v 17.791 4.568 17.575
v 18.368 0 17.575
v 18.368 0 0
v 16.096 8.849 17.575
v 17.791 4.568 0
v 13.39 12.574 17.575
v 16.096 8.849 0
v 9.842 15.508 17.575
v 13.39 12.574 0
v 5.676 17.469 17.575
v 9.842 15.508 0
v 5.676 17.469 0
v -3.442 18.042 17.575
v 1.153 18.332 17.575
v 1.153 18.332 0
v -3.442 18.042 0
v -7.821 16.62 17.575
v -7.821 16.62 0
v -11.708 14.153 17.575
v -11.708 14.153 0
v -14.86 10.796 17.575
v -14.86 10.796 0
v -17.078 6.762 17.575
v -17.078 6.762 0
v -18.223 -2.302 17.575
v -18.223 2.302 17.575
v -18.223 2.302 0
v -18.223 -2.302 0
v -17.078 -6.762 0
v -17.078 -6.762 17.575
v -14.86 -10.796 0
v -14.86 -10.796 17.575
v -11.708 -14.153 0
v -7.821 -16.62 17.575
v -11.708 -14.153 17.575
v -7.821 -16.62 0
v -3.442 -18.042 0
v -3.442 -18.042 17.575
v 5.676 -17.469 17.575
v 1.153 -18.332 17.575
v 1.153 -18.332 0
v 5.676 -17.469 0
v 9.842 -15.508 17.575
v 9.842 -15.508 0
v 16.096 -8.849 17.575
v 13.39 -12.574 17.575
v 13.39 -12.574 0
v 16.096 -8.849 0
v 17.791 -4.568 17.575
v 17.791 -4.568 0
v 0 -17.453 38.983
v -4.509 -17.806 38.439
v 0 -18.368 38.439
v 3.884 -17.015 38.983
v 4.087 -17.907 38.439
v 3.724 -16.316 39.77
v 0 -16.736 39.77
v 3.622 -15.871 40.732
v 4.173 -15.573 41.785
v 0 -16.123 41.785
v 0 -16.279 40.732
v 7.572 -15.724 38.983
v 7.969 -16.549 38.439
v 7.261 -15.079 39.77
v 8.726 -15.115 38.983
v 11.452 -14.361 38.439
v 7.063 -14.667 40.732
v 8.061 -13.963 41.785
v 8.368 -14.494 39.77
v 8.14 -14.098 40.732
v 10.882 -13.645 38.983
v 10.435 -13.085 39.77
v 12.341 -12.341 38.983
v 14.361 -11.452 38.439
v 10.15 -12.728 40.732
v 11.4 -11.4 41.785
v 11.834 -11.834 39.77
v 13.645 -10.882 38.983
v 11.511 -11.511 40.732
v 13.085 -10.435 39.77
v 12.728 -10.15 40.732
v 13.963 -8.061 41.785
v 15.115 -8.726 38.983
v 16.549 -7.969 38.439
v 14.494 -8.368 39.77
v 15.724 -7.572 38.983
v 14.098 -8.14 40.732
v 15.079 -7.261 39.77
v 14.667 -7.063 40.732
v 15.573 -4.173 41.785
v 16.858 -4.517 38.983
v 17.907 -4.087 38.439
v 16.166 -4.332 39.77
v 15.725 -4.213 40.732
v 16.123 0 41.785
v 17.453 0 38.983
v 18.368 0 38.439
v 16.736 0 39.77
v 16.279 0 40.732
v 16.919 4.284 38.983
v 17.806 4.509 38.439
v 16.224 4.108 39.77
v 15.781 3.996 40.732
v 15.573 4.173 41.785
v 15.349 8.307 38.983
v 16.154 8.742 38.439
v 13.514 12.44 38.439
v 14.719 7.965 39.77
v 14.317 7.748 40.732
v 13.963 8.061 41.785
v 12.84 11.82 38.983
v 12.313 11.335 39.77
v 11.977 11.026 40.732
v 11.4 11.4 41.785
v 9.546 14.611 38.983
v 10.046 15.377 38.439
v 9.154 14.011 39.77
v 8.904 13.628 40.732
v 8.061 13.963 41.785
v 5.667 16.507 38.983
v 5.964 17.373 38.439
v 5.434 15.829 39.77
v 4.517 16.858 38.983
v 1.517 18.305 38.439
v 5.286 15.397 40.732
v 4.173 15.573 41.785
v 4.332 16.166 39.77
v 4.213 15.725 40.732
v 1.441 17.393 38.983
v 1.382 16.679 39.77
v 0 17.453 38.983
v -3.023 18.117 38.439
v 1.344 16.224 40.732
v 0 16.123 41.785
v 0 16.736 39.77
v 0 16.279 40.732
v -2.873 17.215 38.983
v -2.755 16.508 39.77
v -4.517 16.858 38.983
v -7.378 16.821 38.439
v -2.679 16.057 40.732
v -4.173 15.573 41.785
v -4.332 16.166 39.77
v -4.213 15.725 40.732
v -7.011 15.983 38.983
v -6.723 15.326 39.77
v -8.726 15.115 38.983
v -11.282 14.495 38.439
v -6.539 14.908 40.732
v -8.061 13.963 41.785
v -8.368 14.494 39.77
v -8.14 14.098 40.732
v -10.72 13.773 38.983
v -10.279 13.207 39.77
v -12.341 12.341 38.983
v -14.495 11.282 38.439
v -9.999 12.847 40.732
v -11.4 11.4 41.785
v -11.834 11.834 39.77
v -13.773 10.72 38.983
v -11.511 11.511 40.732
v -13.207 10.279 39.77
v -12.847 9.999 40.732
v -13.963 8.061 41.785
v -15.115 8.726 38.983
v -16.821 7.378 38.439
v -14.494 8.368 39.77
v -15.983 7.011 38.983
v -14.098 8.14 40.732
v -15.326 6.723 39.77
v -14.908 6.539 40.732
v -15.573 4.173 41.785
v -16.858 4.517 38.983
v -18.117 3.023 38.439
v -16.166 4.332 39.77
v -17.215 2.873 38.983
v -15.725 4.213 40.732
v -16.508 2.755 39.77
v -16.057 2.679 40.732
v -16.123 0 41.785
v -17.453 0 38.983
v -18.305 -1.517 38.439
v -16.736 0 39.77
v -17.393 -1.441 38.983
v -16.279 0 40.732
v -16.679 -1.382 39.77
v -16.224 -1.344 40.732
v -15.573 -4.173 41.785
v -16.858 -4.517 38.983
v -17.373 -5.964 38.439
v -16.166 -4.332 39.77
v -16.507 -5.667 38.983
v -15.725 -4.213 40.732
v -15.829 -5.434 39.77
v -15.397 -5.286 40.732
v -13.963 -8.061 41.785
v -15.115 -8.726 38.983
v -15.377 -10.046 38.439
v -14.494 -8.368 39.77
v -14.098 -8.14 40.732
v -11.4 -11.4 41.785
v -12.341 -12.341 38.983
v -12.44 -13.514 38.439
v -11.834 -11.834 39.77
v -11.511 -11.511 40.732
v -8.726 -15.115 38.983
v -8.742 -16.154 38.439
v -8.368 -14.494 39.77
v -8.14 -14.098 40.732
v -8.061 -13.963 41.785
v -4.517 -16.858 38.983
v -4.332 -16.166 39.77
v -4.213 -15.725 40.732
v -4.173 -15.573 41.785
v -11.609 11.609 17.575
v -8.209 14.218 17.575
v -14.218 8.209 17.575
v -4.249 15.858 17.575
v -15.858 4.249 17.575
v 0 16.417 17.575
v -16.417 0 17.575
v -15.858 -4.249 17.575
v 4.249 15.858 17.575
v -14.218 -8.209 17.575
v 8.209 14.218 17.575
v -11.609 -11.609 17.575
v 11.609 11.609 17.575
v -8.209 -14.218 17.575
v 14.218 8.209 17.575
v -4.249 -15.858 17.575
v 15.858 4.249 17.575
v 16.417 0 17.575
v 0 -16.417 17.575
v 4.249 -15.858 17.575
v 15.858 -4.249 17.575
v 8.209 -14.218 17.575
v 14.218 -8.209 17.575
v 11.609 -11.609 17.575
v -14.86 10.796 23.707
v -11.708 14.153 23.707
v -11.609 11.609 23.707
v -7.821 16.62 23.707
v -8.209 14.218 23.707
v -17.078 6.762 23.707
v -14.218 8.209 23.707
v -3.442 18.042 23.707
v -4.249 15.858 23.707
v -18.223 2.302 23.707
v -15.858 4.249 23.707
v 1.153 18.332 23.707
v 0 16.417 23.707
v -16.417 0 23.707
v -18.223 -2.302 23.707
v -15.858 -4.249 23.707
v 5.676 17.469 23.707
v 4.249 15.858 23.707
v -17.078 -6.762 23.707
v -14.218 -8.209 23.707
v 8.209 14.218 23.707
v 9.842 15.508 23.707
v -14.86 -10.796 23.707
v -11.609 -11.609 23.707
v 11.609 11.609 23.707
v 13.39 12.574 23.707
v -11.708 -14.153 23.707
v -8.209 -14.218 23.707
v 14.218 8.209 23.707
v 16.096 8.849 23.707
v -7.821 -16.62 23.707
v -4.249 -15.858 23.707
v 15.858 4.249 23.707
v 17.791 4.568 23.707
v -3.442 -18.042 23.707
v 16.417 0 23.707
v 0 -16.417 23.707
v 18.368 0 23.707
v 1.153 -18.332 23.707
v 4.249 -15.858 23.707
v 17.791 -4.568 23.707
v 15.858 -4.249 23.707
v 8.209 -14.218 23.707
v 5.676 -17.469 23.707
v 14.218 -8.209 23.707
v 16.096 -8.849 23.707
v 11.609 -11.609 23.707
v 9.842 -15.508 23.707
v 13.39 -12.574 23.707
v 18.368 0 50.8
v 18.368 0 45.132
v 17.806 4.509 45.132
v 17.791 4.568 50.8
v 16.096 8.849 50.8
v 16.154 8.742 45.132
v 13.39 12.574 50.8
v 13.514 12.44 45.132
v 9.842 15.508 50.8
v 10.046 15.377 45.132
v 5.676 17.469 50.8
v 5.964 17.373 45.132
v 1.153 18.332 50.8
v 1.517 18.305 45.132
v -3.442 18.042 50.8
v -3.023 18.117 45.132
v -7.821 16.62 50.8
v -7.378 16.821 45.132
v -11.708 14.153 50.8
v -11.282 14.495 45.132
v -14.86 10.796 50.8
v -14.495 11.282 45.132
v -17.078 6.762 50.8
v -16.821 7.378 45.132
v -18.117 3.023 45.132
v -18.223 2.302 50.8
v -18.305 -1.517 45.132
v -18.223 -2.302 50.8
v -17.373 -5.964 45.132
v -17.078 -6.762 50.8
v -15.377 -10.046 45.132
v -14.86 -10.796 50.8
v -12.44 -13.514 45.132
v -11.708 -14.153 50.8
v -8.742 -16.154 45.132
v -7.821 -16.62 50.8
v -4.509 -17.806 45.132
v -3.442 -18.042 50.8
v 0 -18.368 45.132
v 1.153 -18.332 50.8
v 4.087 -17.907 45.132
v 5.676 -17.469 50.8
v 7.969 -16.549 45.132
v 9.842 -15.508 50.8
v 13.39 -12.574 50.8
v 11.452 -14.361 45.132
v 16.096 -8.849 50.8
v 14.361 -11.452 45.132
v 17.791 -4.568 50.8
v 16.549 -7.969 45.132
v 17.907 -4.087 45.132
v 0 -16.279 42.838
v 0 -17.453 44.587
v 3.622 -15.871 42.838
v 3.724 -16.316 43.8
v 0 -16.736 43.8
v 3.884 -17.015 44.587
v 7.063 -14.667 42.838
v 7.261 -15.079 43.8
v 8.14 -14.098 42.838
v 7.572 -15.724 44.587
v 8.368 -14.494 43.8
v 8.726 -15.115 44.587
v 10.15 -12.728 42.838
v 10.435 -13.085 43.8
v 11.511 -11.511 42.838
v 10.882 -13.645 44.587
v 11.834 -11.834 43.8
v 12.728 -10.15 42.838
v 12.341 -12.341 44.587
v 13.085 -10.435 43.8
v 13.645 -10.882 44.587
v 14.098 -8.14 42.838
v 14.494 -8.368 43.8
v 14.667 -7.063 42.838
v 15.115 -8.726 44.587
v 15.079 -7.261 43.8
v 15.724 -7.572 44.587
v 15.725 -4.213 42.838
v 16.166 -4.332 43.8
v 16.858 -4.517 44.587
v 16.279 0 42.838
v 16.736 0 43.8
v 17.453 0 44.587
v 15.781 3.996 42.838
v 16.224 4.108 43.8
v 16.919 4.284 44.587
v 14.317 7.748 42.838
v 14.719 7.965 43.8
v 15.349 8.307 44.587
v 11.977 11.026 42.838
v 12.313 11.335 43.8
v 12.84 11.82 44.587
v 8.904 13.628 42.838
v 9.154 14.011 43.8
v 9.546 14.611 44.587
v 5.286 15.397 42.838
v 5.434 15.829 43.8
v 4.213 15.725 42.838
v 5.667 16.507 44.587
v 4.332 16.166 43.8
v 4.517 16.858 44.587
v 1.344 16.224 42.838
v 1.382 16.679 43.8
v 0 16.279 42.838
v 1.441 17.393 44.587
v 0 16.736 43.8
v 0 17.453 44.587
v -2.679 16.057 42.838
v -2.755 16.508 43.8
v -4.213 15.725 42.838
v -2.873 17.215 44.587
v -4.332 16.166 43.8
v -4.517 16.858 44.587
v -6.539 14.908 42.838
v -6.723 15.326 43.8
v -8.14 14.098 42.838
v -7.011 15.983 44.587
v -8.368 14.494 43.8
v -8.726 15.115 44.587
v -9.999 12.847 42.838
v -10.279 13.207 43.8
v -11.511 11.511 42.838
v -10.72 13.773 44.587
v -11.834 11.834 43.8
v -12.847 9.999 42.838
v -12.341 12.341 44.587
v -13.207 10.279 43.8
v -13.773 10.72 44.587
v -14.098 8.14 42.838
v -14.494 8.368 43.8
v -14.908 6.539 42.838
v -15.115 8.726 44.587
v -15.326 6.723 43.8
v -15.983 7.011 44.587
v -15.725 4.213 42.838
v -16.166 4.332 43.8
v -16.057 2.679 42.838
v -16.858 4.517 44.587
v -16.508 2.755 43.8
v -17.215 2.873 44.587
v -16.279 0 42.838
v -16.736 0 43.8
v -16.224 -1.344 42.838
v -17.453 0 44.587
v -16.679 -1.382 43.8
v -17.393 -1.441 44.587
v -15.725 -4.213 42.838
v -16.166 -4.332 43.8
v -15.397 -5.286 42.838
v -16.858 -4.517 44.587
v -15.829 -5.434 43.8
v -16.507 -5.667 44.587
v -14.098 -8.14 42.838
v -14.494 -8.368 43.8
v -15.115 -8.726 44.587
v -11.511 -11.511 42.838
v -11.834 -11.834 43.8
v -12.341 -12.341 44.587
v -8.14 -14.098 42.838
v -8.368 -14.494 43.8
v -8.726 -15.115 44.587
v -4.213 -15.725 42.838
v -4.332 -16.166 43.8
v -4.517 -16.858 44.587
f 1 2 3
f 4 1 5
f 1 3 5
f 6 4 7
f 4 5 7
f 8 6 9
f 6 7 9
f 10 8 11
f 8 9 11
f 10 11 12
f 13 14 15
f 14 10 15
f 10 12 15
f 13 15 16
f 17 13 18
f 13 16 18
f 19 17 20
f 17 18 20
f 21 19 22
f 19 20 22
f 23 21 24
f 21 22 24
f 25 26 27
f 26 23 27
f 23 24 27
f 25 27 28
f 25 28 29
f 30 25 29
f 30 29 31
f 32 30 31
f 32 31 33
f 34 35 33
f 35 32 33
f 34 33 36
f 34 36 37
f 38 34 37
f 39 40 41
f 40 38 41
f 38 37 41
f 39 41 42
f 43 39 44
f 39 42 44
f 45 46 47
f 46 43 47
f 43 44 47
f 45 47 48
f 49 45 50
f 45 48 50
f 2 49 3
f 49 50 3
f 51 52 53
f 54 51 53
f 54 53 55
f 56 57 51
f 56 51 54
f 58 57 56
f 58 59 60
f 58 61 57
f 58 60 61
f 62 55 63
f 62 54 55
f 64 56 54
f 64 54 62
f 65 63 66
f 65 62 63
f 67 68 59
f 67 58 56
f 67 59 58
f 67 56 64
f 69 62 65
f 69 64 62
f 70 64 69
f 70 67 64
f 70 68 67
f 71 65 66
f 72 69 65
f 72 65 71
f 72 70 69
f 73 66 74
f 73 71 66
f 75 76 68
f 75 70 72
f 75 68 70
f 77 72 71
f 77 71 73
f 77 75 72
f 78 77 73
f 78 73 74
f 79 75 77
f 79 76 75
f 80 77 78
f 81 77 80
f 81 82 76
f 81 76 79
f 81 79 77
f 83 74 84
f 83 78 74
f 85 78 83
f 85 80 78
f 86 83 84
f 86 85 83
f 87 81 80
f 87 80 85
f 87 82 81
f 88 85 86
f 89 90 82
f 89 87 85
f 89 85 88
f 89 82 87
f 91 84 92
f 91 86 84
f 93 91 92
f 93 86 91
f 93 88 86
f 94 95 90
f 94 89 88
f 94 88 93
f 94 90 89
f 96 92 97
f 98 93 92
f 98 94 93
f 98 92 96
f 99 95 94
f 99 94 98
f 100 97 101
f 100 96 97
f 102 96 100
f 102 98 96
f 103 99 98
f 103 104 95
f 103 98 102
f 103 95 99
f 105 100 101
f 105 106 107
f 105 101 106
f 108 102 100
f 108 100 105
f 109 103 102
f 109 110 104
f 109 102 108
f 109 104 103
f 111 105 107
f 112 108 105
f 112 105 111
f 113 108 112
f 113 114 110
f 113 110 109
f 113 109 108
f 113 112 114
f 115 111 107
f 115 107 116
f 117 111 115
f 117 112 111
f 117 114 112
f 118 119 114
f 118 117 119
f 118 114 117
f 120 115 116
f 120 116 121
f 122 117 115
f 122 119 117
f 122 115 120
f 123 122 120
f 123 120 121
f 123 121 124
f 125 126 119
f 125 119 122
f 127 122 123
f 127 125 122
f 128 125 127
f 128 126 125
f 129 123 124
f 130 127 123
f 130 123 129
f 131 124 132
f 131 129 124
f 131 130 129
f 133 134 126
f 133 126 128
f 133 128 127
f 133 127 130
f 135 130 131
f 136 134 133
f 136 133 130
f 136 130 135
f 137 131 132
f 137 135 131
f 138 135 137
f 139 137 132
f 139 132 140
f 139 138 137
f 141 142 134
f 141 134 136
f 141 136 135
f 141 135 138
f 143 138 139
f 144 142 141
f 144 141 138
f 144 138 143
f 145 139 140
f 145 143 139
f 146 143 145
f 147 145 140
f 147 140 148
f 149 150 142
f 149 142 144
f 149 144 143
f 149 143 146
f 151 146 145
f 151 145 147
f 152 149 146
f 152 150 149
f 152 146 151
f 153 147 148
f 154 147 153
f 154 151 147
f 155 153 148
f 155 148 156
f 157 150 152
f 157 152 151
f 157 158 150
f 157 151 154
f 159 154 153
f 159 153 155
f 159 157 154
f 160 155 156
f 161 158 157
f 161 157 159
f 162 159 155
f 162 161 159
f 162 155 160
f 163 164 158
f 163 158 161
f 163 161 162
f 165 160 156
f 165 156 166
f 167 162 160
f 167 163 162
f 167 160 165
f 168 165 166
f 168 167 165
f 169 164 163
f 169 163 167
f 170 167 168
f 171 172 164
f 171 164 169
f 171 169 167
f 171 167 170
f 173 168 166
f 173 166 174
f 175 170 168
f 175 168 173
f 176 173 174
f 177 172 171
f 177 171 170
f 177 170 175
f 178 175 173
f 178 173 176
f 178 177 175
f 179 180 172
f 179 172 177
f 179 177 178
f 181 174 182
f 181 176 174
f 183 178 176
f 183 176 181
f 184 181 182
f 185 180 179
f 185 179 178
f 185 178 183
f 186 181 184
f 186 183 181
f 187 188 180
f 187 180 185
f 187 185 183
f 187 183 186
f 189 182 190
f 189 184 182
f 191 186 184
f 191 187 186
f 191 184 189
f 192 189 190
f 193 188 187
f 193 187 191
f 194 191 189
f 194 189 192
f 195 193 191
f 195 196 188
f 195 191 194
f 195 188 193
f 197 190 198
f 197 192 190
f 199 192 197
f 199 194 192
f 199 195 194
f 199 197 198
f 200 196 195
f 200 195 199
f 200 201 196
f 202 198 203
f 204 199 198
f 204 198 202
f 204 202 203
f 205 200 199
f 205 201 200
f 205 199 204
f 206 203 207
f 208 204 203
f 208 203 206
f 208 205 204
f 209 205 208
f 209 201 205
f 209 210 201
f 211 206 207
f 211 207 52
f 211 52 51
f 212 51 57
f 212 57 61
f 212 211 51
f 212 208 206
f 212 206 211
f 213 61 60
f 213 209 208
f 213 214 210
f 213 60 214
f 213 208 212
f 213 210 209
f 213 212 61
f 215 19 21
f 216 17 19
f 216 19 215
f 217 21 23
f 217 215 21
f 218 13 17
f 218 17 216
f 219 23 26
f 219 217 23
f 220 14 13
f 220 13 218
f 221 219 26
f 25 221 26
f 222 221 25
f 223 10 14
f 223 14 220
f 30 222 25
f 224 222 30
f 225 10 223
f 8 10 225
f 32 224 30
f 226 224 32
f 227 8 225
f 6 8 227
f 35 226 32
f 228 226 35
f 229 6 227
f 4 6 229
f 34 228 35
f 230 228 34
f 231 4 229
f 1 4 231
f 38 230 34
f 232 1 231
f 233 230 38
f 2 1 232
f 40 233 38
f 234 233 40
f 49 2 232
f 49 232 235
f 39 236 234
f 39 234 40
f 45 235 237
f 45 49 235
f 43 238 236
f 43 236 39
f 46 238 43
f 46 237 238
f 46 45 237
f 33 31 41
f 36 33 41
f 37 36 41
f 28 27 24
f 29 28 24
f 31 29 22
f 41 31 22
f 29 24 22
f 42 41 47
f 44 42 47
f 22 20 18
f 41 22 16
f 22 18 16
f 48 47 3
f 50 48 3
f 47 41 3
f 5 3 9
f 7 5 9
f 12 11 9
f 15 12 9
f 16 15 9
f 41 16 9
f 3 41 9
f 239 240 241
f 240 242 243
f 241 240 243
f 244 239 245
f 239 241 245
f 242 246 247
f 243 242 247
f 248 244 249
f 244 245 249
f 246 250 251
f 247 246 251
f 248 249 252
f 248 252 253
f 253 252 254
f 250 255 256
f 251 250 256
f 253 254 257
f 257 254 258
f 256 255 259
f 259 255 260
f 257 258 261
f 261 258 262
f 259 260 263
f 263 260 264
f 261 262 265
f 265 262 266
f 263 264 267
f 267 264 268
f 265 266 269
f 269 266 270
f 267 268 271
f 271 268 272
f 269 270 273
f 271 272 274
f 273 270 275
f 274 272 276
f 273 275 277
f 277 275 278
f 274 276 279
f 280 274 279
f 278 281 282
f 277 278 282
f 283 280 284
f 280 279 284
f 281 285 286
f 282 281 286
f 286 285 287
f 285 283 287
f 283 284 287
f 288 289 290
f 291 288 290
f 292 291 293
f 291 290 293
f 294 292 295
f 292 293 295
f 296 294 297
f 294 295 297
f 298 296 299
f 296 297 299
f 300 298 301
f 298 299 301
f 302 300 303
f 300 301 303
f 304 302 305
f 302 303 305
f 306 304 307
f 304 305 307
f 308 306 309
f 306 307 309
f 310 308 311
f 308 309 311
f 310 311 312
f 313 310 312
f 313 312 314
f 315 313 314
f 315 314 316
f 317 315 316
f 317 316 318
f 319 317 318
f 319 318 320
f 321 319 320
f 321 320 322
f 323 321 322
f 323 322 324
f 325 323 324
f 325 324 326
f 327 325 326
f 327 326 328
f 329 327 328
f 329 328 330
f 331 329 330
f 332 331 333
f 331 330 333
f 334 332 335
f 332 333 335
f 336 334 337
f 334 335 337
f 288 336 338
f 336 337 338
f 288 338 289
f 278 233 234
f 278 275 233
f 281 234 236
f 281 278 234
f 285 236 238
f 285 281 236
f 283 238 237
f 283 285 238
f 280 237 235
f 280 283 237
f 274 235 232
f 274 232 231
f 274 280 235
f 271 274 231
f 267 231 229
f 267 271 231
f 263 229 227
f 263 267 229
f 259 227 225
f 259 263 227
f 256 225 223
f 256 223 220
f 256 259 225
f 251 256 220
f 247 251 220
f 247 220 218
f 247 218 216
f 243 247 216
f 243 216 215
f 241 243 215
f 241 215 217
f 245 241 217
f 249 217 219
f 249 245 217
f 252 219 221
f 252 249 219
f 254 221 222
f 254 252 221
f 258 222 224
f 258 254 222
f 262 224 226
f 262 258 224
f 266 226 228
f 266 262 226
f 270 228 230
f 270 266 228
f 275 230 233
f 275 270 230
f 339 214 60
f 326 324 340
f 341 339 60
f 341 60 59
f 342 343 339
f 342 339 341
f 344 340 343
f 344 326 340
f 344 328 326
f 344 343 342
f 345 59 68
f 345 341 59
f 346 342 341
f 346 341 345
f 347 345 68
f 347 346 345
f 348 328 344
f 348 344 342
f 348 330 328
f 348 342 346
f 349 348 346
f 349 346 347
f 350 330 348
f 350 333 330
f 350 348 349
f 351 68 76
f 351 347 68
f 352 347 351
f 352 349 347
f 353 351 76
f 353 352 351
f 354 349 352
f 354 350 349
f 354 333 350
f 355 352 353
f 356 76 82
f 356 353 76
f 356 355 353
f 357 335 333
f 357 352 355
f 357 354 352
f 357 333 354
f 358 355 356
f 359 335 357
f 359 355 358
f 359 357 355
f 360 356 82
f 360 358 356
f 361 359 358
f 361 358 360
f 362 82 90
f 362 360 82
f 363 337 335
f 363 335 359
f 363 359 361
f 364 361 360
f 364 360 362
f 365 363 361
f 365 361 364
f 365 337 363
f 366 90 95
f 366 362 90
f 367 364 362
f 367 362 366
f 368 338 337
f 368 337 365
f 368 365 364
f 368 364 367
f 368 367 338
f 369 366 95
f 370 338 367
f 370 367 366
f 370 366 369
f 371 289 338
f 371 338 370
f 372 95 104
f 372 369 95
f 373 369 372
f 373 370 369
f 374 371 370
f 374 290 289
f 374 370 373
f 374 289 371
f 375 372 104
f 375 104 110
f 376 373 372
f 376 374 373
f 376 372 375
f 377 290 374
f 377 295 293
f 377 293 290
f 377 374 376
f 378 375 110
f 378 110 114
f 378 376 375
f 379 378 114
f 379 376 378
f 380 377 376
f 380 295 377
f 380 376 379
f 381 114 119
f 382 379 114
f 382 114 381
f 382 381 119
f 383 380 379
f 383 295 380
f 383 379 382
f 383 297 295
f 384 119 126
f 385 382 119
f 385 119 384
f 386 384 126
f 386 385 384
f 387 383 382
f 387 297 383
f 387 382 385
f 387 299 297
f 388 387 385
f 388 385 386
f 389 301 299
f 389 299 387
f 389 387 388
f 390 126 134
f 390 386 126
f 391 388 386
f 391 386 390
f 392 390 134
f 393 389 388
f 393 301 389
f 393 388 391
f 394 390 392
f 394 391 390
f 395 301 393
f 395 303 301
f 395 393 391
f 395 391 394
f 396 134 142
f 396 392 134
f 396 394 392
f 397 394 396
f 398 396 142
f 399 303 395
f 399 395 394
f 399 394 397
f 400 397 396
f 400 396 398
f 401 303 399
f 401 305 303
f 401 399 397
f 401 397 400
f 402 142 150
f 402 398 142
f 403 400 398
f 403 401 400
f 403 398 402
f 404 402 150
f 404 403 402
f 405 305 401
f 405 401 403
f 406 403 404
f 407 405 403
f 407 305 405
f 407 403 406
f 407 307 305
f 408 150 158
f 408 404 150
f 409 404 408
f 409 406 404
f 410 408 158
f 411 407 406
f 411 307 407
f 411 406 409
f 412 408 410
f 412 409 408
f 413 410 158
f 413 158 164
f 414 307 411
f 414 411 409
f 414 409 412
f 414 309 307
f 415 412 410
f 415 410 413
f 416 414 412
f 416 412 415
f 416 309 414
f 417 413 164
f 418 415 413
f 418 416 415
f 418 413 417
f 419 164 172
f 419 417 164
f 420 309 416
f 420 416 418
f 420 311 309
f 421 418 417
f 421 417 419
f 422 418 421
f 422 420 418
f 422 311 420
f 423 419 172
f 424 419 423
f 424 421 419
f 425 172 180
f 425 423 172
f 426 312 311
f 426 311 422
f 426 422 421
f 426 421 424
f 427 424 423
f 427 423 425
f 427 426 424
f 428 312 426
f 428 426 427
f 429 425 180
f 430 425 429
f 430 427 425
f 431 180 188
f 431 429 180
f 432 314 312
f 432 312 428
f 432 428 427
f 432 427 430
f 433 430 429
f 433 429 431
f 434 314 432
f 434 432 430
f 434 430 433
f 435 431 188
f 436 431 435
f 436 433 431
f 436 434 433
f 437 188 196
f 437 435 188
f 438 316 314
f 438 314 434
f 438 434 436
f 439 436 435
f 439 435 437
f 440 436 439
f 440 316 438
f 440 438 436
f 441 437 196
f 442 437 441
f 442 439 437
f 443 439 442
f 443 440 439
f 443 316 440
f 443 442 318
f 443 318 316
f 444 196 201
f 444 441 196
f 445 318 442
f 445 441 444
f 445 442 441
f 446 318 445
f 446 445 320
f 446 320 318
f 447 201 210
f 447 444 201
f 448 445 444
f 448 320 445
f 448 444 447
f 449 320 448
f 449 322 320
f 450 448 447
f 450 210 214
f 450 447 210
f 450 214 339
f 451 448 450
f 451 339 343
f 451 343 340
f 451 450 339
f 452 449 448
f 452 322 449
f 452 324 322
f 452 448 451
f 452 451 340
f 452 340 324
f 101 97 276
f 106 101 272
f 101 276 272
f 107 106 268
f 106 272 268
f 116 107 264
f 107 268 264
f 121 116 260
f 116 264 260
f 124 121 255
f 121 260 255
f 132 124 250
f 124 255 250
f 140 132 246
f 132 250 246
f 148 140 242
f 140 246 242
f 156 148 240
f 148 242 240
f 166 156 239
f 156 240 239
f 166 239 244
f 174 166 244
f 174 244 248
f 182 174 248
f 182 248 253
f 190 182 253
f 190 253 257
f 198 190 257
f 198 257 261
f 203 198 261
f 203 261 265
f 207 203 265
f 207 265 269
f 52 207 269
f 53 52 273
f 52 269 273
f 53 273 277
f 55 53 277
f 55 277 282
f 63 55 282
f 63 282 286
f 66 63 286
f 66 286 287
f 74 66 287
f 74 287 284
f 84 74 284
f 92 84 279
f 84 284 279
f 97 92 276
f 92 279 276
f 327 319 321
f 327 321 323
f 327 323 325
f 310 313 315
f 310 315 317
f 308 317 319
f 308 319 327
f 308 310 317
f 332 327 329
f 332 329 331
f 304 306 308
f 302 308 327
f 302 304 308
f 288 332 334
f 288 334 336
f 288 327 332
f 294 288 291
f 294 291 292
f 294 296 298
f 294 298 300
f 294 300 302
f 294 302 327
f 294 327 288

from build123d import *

# Parameters (mm, degrees)
F0_R     = 18.36779
F1_DEPTH = 50.8
F2_R     = 3.616434
F2_W     = 6.643541
F2_H     = 6.132498


with BuildPart() as f1:
    # F0 (on Top) → F1 (new body)
    with BuildSketch(Plane.XY):
        Circle(F0_R)
    extrude(amount=F1_DEPTH)

    # F2 (on Right) → F3 (revolve, cut)
    with BuildSketch(Plane.YZ):
        with Locations((-19.738993, 41.785281)):
            Circle(F2_R)
        with Locations((-19.738992, 20.640921)):
            Rectangle(F2_W, F2_H)
    revolve(axis=Axis((0, 0, 23.766607), (0, 0, 1)), mode=Mode.SUBTRACT)


solid = f1.part
